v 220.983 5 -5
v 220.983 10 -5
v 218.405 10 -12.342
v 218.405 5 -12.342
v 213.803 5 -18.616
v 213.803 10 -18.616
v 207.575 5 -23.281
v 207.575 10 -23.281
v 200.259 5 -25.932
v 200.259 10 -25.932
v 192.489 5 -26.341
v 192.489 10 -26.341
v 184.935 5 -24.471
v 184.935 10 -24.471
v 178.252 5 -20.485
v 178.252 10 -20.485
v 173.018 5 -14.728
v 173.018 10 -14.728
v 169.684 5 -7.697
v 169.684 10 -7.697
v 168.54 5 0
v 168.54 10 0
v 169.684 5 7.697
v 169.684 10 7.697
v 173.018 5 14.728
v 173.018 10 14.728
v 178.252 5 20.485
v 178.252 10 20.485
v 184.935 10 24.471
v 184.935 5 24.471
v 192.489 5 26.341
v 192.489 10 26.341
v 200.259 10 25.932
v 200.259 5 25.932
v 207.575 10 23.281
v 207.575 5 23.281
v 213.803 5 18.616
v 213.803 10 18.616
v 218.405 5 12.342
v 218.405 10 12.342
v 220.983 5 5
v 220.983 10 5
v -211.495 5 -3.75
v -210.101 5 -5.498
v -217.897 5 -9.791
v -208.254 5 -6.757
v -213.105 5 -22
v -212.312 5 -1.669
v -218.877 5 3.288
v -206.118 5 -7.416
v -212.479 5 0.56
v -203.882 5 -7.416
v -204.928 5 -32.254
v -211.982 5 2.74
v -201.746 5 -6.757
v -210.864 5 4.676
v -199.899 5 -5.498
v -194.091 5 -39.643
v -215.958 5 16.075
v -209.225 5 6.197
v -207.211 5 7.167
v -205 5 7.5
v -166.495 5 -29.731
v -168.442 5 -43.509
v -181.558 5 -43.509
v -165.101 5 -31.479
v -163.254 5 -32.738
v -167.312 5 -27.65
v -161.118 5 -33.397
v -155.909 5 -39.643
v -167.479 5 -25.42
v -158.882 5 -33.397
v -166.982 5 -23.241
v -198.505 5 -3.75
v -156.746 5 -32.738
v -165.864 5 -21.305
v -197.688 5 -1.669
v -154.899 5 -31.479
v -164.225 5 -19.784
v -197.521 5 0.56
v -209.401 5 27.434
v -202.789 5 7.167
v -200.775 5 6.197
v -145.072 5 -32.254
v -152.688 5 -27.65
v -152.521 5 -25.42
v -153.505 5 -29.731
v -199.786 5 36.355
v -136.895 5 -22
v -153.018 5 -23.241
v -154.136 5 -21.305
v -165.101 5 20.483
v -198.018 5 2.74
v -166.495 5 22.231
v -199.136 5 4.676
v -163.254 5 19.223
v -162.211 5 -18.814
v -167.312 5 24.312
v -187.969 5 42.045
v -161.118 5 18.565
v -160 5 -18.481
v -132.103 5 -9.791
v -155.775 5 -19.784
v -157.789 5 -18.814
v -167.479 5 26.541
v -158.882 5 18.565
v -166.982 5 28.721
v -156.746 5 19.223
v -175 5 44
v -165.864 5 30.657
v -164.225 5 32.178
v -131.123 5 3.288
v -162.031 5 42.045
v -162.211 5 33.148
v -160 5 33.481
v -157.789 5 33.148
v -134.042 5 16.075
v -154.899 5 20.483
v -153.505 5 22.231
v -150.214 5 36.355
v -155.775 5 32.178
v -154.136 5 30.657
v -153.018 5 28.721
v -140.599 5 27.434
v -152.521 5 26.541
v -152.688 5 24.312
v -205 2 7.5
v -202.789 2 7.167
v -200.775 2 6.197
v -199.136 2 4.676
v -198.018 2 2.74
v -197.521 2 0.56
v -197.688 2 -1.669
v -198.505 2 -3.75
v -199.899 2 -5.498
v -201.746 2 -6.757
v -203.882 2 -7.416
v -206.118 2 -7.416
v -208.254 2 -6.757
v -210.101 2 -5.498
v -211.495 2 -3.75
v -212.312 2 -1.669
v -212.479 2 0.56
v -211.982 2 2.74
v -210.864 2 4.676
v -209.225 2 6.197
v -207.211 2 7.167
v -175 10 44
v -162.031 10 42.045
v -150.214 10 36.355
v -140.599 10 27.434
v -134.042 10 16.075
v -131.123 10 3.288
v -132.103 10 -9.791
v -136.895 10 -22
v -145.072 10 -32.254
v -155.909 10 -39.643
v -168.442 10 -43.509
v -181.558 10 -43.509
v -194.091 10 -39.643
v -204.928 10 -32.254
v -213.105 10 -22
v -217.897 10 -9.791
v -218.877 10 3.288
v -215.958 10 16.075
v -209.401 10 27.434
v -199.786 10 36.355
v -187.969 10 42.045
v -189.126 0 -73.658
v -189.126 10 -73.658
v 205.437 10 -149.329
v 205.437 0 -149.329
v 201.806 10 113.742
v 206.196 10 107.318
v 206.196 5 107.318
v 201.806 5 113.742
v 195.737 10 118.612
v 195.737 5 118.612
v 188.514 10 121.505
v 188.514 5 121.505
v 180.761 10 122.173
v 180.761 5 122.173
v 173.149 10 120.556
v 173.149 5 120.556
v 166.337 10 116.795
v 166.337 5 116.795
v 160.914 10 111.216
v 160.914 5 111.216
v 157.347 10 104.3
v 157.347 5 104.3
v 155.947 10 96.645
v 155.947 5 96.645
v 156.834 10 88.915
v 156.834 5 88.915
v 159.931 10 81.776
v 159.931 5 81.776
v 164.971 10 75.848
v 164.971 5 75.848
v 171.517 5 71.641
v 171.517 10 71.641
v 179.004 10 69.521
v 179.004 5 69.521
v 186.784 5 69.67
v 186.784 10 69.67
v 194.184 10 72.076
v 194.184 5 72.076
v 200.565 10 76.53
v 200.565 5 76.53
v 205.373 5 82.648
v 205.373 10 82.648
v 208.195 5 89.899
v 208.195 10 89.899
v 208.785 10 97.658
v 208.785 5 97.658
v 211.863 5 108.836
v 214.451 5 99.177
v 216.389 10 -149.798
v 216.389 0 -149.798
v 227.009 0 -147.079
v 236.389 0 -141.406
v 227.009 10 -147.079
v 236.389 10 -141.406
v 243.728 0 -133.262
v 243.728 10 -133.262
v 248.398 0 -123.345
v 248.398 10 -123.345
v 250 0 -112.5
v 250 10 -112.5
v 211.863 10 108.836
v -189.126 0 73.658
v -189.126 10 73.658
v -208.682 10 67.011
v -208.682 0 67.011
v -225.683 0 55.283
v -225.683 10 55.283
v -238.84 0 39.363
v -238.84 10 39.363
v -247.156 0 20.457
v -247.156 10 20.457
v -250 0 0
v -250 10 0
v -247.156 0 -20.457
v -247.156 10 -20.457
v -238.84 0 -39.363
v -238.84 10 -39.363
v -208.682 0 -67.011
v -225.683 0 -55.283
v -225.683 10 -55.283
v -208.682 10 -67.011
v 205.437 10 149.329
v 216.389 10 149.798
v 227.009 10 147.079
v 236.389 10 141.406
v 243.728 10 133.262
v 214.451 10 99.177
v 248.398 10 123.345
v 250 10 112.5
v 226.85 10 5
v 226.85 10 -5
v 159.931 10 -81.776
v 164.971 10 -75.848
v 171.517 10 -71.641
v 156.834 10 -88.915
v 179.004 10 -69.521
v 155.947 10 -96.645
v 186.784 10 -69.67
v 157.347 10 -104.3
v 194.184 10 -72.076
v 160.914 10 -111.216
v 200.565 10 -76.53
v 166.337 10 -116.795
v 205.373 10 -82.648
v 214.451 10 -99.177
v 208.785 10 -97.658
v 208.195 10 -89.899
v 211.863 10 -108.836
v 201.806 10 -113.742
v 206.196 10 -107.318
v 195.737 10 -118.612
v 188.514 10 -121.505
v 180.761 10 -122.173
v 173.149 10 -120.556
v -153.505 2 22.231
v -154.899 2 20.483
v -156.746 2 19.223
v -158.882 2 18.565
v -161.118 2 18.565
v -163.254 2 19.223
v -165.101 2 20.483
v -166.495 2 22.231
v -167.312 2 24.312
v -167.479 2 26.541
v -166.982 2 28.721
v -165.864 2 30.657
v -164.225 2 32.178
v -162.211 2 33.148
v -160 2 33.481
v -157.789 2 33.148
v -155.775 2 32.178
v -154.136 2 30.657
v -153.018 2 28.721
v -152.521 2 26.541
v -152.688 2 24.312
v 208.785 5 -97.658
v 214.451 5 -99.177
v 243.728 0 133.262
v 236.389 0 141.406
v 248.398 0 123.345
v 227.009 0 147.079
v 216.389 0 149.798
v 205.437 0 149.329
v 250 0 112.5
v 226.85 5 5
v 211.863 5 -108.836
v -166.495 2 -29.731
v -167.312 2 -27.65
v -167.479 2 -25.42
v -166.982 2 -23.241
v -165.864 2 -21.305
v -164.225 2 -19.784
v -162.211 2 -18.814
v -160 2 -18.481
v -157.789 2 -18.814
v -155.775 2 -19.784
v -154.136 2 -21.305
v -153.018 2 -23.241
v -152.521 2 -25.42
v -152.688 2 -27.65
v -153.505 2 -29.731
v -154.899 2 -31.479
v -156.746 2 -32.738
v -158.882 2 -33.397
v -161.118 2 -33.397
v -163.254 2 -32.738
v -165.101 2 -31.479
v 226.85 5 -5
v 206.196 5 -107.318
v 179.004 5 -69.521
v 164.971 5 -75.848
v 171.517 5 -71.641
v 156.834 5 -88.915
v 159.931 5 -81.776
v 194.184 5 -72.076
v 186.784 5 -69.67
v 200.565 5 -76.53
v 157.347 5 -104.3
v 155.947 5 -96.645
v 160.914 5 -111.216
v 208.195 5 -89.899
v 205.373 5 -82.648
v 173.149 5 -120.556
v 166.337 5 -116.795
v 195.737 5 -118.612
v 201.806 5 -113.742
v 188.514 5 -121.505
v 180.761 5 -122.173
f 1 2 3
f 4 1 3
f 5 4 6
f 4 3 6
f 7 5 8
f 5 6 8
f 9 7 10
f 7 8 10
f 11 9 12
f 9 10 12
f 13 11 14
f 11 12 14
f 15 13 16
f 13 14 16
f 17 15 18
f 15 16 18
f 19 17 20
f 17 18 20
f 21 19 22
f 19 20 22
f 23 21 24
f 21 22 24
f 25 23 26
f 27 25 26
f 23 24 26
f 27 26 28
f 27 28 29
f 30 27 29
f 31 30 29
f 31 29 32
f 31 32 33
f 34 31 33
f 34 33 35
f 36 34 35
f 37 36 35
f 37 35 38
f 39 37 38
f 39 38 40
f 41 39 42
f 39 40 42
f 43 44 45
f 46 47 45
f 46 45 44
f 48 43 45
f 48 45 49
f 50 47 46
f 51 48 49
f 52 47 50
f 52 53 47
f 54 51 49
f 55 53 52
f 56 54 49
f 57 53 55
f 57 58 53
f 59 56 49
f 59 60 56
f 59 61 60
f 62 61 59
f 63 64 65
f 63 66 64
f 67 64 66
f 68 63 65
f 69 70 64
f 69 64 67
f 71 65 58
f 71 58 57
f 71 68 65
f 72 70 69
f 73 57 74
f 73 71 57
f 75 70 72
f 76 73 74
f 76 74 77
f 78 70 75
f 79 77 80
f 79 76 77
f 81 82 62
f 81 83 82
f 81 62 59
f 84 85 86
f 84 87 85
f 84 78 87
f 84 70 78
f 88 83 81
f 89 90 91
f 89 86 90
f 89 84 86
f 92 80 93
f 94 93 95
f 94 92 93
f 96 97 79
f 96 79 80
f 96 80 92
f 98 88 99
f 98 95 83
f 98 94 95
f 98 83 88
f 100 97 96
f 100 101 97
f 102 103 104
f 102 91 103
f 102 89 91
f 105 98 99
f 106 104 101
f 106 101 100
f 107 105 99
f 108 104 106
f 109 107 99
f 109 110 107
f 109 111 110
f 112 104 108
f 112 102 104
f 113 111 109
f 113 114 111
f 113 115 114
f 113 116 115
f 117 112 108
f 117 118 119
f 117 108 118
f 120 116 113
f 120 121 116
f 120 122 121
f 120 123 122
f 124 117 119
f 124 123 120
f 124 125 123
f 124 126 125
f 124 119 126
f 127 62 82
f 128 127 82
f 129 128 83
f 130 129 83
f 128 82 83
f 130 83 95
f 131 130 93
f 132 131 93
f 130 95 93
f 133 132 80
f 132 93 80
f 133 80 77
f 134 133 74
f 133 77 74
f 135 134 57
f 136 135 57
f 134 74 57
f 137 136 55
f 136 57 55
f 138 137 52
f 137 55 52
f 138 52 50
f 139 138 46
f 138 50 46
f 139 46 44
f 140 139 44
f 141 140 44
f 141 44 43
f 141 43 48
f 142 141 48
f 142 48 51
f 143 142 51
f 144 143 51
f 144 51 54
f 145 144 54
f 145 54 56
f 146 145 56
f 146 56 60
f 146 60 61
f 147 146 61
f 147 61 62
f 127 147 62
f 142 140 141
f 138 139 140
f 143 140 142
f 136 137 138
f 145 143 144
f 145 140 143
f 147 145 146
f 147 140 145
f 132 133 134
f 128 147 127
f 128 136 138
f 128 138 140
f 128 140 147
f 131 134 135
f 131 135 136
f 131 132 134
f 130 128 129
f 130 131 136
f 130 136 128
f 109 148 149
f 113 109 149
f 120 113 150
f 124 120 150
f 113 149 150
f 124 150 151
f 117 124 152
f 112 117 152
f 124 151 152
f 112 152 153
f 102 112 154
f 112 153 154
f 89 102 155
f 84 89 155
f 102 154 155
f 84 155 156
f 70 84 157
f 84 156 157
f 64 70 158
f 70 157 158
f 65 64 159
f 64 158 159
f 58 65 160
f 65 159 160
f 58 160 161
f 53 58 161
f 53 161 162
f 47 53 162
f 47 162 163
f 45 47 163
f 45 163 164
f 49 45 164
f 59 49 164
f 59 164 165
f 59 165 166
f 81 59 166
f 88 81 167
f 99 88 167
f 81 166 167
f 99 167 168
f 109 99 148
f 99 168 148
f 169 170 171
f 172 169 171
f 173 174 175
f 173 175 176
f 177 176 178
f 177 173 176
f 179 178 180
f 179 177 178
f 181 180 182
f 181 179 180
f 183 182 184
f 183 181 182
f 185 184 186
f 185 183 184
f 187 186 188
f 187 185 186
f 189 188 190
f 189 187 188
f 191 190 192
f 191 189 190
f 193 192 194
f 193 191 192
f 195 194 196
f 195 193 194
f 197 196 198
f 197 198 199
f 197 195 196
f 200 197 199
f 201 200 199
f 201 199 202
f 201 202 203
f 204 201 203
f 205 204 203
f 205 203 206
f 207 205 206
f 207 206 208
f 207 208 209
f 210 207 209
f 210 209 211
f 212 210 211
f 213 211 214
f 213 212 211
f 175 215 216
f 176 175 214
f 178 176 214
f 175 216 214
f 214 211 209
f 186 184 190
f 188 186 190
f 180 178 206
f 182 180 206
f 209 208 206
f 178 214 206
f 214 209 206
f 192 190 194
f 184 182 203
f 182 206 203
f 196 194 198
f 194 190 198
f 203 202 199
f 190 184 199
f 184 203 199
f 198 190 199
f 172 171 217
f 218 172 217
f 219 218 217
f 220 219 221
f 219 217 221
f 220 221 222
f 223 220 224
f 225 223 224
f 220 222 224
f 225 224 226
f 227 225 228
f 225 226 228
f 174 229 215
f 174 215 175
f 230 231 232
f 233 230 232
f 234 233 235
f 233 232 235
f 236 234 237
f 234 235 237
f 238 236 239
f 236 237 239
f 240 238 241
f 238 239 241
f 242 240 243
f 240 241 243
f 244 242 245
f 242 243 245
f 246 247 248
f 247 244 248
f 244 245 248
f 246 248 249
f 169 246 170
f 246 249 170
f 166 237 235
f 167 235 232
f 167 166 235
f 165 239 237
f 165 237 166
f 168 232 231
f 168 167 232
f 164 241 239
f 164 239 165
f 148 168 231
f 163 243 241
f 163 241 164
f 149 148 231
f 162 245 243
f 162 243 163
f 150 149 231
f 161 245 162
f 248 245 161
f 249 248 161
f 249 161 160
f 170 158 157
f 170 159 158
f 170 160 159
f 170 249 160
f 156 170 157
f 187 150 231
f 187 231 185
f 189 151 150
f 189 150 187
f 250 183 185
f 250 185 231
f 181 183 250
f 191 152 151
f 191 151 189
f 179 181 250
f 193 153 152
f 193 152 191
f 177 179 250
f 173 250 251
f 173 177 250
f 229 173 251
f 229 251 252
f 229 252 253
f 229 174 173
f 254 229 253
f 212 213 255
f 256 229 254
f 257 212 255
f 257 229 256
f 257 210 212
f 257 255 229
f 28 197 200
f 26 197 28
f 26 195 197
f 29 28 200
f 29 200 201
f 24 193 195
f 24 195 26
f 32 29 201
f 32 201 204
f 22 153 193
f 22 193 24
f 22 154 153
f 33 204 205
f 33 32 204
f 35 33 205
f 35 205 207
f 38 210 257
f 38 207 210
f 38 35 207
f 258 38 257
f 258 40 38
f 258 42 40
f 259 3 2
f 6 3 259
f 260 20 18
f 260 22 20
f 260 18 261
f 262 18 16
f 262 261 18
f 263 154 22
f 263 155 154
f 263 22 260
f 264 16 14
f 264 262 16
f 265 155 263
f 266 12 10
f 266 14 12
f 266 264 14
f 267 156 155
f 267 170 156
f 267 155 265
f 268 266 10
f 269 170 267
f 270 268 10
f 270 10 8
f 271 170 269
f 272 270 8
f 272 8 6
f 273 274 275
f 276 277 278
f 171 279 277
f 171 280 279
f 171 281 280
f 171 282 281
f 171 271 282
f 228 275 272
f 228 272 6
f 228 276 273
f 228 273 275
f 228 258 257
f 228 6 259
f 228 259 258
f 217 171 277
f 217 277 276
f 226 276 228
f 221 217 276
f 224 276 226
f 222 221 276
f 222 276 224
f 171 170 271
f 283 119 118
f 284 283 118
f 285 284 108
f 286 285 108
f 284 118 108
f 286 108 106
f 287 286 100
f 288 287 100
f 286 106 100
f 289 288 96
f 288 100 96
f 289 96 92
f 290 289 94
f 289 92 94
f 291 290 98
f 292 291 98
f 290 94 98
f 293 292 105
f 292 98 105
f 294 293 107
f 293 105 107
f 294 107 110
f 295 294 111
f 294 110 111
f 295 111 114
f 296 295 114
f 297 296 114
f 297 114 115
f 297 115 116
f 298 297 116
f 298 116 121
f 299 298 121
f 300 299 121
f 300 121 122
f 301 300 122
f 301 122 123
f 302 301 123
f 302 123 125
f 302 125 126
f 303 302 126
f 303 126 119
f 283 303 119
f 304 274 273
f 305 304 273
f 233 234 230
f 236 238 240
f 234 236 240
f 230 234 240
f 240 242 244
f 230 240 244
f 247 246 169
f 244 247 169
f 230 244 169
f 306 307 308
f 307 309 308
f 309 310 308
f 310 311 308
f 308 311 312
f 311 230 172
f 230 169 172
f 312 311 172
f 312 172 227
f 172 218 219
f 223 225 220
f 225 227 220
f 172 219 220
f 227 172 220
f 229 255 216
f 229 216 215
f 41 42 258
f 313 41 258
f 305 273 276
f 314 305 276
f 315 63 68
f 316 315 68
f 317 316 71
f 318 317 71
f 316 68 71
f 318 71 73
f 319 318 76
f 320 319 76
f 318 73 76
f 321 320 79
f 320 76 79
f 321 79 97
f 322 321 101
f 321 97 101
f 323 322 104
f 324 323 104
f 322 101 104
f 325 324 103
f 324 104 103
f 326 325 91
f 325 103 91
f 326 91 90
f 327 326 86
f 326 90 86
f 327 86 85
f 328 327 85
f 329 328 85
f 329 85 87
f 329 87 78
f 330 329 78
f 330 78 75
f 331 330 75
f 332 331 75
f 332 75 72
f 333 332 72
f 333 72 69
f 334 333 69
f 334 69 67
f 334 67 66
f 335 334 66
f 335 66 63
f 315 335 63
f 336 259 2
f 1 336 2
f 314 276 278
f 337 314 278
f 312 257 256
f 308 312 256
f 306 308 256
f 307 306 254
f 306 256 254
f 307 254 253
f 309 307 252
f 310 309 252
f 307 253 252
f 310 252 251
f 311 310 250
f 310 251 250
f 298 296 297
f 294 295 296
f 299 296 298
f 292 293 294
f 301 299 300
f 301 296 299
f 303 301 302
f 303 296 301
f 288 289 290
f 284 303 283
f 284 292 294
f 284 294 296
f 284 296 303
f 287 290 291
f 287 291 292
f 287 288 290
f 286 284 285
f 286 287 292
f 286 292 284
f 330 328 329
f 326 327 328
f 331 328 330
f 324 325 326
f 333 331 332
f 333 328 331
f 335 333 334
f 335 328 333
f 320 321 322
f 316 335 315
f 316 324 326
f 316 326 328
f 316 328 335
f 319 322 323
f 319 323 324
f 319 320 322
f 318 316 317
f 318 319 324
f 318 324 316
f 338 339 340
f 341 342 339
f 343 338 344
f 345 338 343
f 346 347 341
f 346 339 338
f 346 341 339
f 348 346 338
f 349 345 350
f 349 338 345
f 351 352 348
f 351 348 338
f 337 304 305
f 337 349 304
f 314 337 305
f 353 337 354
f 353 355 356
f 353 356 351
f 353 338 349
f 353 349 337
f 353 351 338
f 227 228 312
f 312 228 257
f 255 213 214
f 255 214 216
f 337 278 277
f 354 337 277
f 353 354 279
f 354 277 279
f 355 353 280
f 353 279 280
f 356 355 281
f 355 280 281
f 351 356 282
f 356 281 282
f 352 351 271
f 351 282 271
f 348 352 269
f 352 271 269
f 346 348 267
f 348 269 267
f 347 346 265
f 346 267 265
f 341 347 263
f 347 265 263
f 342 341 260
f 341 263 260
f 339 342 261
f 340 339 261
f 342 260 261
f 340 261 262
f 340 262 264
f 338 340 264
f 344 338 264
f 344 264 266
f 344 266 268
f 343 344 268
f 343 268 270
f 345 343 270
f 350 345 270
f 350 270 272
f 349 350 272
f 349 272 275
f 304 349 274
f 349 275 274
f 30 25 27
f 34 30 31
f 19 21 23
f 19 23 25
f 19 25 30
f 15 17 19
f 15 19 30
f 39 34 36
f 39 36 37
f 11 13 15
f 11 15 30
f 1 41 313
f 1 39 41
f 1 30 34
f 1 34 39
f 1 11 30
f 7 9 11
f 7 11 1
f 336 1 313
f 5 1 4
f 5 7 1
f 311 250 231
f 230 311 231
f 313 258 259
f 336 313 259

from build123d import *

# Parameters (mm, degrees)
IZIM2_W                        = 500
IZIM2_H                        = 300
Y_KSEKLIK_EKSTR_ZYON2_DEPTH    = 10
IZIM3_OUTSIDE_W                = 618.636
IZIM3_OUTSIDE_H                = 418.636
KES_EKSTR_ZYON1_DEPTH          = 10
TABAKLARI_UZAKLASTIRMA_2_DEPTH = 5
DAIRESEL_KAPLAMA1_COUNT        = 2
DAIRESEL_KAPLAMA1_ANGLE        = 15
AYNALAMA1_COPY_1_DEPTH         = 5
AYNALAMA1_COPY_2_DEPTH         = 5
IZIM9_R                        = 7.5
KES_EKSTR_ZYON4_DEPTH          = 8
DAIRESEL_KAPLAMA2_COUNT        = 3
IZIM10_R                       = 44
KES_EKSTR_ZYON5_DEPTH          = 5


with BuildPart() as part:
    # Çizim2 → Yükseklik-Ekstrüzyon2 (new body)
    with BuildSketch(Plane(origin=(0, 0, 0), x_dir=(1, 0, 0), z_dir=(0, 1, 0))):
        Rectangle(IZIM2_W, IZIM2_H)
    extrude(amount=Y_KSEKLIK_EKSTR_ZYON2_DEPTH)

    # Çizim3 outside → Kes-Ekstrüzyon1 (cut)
    with BuildSketch(Plane(origin=(0, 10, 0), x_dir=(1, 0, 0), z_dir=(0, 1, 0))):
        Rectangle(IZIM3_OUTSIDE_W, IZIM3_OUTSIDE_H)
        with BuildLine():
            Line((-189.1264052, 73.65761791), (205.4367974, 149.328808955))
            ThreePointArc((205.4367974, 149.328808955), (236.389117842, 141.406055572), (250, 112.5))
            Line((250, 112.5), (250, -112.5))
            ThreePointArc((250, -112.5), (236.389117842, -141.406055572), (205.4367974, -149.328808955))
            Line((205.4367974, -149.328808955), (-189.1264052, -73.65761791))
            ThreePointArc((-189.1264052, -73.65761791), (-250, 0), (-189.1264052, 73.65761791))
        make_face(mode=Mode.SUBTRACT)
    extrude(amount=-KES_EKSTR_ZYON1_DEPTH, mode=Mode.SUBTRACT)

    # Çizim6 → Tabaklari-uzaklastirma-2 (cut)
    with BuildSketch(Plane(origin=(0, 10, 0), x_dir=(1, 0, 0), z_dir=(0, 1, 0))):
        with BuildLine():
            Line((226.85, 5), (220.983294633, 5))
            ThreePointArc((220.983294633, 5), (221.340554056, 2.511336696), (221.46, 0))
            ThreePointArc((221.46, 0), (221.340554056, -2.511336696), (220.983294633, -5))
            Line((220.983294633, -5), (226.85, -5))
            Line((226.85, -5), (226.85, 5))
        make_face()
        with BuildLine():
            Line((206.85, -5), (206.85, 5))
            Line((206.85, 5), (220.983294633, 5))
            ThreePointArc((220.983294633, 5), (168.54, 0), (220.983294633, -5))
            Line((220.983294633, -5), (206.85, -5))
        make_face()
        with BuildLine():
            Line((220.983294633, 5), (206.85, 5))
            Line((206.85, 5), (206.85, -5))
            Line((206.85, -5), (220.983294633, -5))
            ThreePointArc((220.983294633, -5), (221.340554056, -2.511336696), (221.46, 0))
            ThreePointArc((221.46, 0), (221.340554056, 2.511336696), (220.983294633, 5))
        make_face()
    tabaklari_uzaklastirma_2 = extrude(amount=-TABAKLARI_UZAKLASTIRMA_2_DEPTH, mode=Mode.SUBTRACT)

    # Dairesel Kaplama1: Tabaklari-uzaklastirma-2 ×2 about axis
    dairesel_kaplama1_axis = Axis((-175, 0, 0), (0, 1, 0))
    for i in range(1, DAIRESEL_KAPLAMA1_COUNT):
        add(tabaklari_uzaklastirma_2.rotate(dairesel_kaplama1_axis, i * DAIRESEL_KAPLAMA1_ANGLE / (DAIRESEL_KAPLAMA1_COUNT - 1)), mode=Mode.SUBTRACT)

    # Aynalama1 copy 1 sketch → Aynalama1 copy 1 (cut)
    with BuildSketch(Plane(origin=(-5.962980399, 10, 45.293332893), x_dir=(0.9659258262890681, 0, 0.2588190451025214), z_dir=(0, 1, 0))):
        with BuildLine():
            Line((226.85, -5), (220.983294633, -5))
            ThreePointArc((220.983294633, -5), (221.340554056, -2.511336696), (221.46, 0))
            ThreePointArc((221.46, 0), (221.340554056, 2.511336696), (220.983294633, 5))
            Line((220.983294633, 5), (226.85, 5))
            Line((226.85, 5), (226.85, -5))
        make_face()
        with BuildLine():
            Line((206.85, 5), (206.85, -5))
            Line((206.85, -5), (220.983294633, -5))
            ThreePointArc((220.983294633, -5), (168.54, 0), (220.983294633, 5))
            Line((220.983294633, 5), (206.85, 5))
        make_face()
        with BuildLine():
            Line((220.983294633, -5), (206.85, -5))
            Line((206.85, -5), (206.85, 5))
            Line((206.85, 5), (220.983294633, 5))
            ThreePointArc((220.983294633, 5), (221.340554056, 2.511336696), (221.46, 0))
            ThreePointArc((221.46, 0), (221.340554056, -2.511336696), (220.983294633, -5))
        make_face()
    extrude(amount=-AYNALAMA1_COPY_1_DEPTH, mode=Mode.SUBTRACT)

    # Aynalama1 copy 2 sketch → Aynalama1 copy 2 (cut)
    with BuildSketch(Plane(origin=(0, 10, 0), x_dir=(1, 0, 0), z_dir=(0, 1, 0))):
        with BuildLine():
            Line((226.85, -5), (220.983294633, -5))
            ThreePointArc((220.983294633, -5), (221.340554056, -2.511336696), (221.46, 0))
            ThreePointArc((221.46, 0), (221.340554056, 2.511336696), (220.983294633, 5))
            Line((220.983294633, 5), (226.85, 5))
            Line((226.85, 5), (226.85, -5))
        make_face()
        with BuildLine():
            Line((206.85, 5), (206.85, -5))
            Line((206.85, -5), (220.983294633, -5))
            ThreePointArc((220.983294633, -5), (168.54, 0), (220.983294633, 5))
            Line((220.983294633, 5), (206.85, 5))
        make_face()
        with BuildLine():
            Line((220.983294633, -5), (206.85, -5))
            Line((206.85, -5), (206.85, 5))
            Line((206.85, 5), (220.983294633, 5))
            ThreePointArc((220.983294633, 5), (221.340554056, 2.511336696), (221.46, 0))
            ThreePointArc((221.46, 0), (221.340554056, -2.511336696), (220.983294633, -5))
        make_face()
    extrude(amount=-AYNALAMA1_COPY_2_DEPTH, mode=Mode.SUBTRACT)

    # Çizim9 → Kes-Ekstrüzyon4 (cut)
    with BuildSketch(Plane(origin=(0, 10, 0), x_dir=(1, 0, 0), z_dir=(0, 1, 0))):
        with Locations(Location((-205, 0, 0), (0, 0, 270))):
            Circle(IZIM9_R)
    kes_ekstr_zyon4 = extrude(amount=-KES_EKSTR_ZYON4_DEPTH, mode=Mode.SUBTRACT)

    # Dairesel Kaplama2: Kes-Ekstrüzyon4 ×3 about axis
    dairesel_kaplama2_axis = Axis((-175, 0, 0), (0, 1, 0))
    for i in range(1, DAIRESEL_KAPLAMA2_COUNT):
        add(kes_ekstr_zyon4.rotate(dairesel_kaplama2_axis, i * 360 / DAIRESEL_KAPLAMA2_COUNT), mode=Mode.SUBTRACT)

    # Çizim10 → Kes-Ekstrüzyon5 (cut)
    with BuildSketch(Plane(origin=(0, 10, 0), x_dir=(1, 0, 0), z_dir=(0, 1, 0))):
        with Locations(Location((-175, 0, 0), (0, 0, 270))):
            Circle(IZIM10_R)
    extrude(amount=-KES_EKSTR_ZYON5_DEPTH, mode=Mode.SUBTRACT)


solid = part.part
